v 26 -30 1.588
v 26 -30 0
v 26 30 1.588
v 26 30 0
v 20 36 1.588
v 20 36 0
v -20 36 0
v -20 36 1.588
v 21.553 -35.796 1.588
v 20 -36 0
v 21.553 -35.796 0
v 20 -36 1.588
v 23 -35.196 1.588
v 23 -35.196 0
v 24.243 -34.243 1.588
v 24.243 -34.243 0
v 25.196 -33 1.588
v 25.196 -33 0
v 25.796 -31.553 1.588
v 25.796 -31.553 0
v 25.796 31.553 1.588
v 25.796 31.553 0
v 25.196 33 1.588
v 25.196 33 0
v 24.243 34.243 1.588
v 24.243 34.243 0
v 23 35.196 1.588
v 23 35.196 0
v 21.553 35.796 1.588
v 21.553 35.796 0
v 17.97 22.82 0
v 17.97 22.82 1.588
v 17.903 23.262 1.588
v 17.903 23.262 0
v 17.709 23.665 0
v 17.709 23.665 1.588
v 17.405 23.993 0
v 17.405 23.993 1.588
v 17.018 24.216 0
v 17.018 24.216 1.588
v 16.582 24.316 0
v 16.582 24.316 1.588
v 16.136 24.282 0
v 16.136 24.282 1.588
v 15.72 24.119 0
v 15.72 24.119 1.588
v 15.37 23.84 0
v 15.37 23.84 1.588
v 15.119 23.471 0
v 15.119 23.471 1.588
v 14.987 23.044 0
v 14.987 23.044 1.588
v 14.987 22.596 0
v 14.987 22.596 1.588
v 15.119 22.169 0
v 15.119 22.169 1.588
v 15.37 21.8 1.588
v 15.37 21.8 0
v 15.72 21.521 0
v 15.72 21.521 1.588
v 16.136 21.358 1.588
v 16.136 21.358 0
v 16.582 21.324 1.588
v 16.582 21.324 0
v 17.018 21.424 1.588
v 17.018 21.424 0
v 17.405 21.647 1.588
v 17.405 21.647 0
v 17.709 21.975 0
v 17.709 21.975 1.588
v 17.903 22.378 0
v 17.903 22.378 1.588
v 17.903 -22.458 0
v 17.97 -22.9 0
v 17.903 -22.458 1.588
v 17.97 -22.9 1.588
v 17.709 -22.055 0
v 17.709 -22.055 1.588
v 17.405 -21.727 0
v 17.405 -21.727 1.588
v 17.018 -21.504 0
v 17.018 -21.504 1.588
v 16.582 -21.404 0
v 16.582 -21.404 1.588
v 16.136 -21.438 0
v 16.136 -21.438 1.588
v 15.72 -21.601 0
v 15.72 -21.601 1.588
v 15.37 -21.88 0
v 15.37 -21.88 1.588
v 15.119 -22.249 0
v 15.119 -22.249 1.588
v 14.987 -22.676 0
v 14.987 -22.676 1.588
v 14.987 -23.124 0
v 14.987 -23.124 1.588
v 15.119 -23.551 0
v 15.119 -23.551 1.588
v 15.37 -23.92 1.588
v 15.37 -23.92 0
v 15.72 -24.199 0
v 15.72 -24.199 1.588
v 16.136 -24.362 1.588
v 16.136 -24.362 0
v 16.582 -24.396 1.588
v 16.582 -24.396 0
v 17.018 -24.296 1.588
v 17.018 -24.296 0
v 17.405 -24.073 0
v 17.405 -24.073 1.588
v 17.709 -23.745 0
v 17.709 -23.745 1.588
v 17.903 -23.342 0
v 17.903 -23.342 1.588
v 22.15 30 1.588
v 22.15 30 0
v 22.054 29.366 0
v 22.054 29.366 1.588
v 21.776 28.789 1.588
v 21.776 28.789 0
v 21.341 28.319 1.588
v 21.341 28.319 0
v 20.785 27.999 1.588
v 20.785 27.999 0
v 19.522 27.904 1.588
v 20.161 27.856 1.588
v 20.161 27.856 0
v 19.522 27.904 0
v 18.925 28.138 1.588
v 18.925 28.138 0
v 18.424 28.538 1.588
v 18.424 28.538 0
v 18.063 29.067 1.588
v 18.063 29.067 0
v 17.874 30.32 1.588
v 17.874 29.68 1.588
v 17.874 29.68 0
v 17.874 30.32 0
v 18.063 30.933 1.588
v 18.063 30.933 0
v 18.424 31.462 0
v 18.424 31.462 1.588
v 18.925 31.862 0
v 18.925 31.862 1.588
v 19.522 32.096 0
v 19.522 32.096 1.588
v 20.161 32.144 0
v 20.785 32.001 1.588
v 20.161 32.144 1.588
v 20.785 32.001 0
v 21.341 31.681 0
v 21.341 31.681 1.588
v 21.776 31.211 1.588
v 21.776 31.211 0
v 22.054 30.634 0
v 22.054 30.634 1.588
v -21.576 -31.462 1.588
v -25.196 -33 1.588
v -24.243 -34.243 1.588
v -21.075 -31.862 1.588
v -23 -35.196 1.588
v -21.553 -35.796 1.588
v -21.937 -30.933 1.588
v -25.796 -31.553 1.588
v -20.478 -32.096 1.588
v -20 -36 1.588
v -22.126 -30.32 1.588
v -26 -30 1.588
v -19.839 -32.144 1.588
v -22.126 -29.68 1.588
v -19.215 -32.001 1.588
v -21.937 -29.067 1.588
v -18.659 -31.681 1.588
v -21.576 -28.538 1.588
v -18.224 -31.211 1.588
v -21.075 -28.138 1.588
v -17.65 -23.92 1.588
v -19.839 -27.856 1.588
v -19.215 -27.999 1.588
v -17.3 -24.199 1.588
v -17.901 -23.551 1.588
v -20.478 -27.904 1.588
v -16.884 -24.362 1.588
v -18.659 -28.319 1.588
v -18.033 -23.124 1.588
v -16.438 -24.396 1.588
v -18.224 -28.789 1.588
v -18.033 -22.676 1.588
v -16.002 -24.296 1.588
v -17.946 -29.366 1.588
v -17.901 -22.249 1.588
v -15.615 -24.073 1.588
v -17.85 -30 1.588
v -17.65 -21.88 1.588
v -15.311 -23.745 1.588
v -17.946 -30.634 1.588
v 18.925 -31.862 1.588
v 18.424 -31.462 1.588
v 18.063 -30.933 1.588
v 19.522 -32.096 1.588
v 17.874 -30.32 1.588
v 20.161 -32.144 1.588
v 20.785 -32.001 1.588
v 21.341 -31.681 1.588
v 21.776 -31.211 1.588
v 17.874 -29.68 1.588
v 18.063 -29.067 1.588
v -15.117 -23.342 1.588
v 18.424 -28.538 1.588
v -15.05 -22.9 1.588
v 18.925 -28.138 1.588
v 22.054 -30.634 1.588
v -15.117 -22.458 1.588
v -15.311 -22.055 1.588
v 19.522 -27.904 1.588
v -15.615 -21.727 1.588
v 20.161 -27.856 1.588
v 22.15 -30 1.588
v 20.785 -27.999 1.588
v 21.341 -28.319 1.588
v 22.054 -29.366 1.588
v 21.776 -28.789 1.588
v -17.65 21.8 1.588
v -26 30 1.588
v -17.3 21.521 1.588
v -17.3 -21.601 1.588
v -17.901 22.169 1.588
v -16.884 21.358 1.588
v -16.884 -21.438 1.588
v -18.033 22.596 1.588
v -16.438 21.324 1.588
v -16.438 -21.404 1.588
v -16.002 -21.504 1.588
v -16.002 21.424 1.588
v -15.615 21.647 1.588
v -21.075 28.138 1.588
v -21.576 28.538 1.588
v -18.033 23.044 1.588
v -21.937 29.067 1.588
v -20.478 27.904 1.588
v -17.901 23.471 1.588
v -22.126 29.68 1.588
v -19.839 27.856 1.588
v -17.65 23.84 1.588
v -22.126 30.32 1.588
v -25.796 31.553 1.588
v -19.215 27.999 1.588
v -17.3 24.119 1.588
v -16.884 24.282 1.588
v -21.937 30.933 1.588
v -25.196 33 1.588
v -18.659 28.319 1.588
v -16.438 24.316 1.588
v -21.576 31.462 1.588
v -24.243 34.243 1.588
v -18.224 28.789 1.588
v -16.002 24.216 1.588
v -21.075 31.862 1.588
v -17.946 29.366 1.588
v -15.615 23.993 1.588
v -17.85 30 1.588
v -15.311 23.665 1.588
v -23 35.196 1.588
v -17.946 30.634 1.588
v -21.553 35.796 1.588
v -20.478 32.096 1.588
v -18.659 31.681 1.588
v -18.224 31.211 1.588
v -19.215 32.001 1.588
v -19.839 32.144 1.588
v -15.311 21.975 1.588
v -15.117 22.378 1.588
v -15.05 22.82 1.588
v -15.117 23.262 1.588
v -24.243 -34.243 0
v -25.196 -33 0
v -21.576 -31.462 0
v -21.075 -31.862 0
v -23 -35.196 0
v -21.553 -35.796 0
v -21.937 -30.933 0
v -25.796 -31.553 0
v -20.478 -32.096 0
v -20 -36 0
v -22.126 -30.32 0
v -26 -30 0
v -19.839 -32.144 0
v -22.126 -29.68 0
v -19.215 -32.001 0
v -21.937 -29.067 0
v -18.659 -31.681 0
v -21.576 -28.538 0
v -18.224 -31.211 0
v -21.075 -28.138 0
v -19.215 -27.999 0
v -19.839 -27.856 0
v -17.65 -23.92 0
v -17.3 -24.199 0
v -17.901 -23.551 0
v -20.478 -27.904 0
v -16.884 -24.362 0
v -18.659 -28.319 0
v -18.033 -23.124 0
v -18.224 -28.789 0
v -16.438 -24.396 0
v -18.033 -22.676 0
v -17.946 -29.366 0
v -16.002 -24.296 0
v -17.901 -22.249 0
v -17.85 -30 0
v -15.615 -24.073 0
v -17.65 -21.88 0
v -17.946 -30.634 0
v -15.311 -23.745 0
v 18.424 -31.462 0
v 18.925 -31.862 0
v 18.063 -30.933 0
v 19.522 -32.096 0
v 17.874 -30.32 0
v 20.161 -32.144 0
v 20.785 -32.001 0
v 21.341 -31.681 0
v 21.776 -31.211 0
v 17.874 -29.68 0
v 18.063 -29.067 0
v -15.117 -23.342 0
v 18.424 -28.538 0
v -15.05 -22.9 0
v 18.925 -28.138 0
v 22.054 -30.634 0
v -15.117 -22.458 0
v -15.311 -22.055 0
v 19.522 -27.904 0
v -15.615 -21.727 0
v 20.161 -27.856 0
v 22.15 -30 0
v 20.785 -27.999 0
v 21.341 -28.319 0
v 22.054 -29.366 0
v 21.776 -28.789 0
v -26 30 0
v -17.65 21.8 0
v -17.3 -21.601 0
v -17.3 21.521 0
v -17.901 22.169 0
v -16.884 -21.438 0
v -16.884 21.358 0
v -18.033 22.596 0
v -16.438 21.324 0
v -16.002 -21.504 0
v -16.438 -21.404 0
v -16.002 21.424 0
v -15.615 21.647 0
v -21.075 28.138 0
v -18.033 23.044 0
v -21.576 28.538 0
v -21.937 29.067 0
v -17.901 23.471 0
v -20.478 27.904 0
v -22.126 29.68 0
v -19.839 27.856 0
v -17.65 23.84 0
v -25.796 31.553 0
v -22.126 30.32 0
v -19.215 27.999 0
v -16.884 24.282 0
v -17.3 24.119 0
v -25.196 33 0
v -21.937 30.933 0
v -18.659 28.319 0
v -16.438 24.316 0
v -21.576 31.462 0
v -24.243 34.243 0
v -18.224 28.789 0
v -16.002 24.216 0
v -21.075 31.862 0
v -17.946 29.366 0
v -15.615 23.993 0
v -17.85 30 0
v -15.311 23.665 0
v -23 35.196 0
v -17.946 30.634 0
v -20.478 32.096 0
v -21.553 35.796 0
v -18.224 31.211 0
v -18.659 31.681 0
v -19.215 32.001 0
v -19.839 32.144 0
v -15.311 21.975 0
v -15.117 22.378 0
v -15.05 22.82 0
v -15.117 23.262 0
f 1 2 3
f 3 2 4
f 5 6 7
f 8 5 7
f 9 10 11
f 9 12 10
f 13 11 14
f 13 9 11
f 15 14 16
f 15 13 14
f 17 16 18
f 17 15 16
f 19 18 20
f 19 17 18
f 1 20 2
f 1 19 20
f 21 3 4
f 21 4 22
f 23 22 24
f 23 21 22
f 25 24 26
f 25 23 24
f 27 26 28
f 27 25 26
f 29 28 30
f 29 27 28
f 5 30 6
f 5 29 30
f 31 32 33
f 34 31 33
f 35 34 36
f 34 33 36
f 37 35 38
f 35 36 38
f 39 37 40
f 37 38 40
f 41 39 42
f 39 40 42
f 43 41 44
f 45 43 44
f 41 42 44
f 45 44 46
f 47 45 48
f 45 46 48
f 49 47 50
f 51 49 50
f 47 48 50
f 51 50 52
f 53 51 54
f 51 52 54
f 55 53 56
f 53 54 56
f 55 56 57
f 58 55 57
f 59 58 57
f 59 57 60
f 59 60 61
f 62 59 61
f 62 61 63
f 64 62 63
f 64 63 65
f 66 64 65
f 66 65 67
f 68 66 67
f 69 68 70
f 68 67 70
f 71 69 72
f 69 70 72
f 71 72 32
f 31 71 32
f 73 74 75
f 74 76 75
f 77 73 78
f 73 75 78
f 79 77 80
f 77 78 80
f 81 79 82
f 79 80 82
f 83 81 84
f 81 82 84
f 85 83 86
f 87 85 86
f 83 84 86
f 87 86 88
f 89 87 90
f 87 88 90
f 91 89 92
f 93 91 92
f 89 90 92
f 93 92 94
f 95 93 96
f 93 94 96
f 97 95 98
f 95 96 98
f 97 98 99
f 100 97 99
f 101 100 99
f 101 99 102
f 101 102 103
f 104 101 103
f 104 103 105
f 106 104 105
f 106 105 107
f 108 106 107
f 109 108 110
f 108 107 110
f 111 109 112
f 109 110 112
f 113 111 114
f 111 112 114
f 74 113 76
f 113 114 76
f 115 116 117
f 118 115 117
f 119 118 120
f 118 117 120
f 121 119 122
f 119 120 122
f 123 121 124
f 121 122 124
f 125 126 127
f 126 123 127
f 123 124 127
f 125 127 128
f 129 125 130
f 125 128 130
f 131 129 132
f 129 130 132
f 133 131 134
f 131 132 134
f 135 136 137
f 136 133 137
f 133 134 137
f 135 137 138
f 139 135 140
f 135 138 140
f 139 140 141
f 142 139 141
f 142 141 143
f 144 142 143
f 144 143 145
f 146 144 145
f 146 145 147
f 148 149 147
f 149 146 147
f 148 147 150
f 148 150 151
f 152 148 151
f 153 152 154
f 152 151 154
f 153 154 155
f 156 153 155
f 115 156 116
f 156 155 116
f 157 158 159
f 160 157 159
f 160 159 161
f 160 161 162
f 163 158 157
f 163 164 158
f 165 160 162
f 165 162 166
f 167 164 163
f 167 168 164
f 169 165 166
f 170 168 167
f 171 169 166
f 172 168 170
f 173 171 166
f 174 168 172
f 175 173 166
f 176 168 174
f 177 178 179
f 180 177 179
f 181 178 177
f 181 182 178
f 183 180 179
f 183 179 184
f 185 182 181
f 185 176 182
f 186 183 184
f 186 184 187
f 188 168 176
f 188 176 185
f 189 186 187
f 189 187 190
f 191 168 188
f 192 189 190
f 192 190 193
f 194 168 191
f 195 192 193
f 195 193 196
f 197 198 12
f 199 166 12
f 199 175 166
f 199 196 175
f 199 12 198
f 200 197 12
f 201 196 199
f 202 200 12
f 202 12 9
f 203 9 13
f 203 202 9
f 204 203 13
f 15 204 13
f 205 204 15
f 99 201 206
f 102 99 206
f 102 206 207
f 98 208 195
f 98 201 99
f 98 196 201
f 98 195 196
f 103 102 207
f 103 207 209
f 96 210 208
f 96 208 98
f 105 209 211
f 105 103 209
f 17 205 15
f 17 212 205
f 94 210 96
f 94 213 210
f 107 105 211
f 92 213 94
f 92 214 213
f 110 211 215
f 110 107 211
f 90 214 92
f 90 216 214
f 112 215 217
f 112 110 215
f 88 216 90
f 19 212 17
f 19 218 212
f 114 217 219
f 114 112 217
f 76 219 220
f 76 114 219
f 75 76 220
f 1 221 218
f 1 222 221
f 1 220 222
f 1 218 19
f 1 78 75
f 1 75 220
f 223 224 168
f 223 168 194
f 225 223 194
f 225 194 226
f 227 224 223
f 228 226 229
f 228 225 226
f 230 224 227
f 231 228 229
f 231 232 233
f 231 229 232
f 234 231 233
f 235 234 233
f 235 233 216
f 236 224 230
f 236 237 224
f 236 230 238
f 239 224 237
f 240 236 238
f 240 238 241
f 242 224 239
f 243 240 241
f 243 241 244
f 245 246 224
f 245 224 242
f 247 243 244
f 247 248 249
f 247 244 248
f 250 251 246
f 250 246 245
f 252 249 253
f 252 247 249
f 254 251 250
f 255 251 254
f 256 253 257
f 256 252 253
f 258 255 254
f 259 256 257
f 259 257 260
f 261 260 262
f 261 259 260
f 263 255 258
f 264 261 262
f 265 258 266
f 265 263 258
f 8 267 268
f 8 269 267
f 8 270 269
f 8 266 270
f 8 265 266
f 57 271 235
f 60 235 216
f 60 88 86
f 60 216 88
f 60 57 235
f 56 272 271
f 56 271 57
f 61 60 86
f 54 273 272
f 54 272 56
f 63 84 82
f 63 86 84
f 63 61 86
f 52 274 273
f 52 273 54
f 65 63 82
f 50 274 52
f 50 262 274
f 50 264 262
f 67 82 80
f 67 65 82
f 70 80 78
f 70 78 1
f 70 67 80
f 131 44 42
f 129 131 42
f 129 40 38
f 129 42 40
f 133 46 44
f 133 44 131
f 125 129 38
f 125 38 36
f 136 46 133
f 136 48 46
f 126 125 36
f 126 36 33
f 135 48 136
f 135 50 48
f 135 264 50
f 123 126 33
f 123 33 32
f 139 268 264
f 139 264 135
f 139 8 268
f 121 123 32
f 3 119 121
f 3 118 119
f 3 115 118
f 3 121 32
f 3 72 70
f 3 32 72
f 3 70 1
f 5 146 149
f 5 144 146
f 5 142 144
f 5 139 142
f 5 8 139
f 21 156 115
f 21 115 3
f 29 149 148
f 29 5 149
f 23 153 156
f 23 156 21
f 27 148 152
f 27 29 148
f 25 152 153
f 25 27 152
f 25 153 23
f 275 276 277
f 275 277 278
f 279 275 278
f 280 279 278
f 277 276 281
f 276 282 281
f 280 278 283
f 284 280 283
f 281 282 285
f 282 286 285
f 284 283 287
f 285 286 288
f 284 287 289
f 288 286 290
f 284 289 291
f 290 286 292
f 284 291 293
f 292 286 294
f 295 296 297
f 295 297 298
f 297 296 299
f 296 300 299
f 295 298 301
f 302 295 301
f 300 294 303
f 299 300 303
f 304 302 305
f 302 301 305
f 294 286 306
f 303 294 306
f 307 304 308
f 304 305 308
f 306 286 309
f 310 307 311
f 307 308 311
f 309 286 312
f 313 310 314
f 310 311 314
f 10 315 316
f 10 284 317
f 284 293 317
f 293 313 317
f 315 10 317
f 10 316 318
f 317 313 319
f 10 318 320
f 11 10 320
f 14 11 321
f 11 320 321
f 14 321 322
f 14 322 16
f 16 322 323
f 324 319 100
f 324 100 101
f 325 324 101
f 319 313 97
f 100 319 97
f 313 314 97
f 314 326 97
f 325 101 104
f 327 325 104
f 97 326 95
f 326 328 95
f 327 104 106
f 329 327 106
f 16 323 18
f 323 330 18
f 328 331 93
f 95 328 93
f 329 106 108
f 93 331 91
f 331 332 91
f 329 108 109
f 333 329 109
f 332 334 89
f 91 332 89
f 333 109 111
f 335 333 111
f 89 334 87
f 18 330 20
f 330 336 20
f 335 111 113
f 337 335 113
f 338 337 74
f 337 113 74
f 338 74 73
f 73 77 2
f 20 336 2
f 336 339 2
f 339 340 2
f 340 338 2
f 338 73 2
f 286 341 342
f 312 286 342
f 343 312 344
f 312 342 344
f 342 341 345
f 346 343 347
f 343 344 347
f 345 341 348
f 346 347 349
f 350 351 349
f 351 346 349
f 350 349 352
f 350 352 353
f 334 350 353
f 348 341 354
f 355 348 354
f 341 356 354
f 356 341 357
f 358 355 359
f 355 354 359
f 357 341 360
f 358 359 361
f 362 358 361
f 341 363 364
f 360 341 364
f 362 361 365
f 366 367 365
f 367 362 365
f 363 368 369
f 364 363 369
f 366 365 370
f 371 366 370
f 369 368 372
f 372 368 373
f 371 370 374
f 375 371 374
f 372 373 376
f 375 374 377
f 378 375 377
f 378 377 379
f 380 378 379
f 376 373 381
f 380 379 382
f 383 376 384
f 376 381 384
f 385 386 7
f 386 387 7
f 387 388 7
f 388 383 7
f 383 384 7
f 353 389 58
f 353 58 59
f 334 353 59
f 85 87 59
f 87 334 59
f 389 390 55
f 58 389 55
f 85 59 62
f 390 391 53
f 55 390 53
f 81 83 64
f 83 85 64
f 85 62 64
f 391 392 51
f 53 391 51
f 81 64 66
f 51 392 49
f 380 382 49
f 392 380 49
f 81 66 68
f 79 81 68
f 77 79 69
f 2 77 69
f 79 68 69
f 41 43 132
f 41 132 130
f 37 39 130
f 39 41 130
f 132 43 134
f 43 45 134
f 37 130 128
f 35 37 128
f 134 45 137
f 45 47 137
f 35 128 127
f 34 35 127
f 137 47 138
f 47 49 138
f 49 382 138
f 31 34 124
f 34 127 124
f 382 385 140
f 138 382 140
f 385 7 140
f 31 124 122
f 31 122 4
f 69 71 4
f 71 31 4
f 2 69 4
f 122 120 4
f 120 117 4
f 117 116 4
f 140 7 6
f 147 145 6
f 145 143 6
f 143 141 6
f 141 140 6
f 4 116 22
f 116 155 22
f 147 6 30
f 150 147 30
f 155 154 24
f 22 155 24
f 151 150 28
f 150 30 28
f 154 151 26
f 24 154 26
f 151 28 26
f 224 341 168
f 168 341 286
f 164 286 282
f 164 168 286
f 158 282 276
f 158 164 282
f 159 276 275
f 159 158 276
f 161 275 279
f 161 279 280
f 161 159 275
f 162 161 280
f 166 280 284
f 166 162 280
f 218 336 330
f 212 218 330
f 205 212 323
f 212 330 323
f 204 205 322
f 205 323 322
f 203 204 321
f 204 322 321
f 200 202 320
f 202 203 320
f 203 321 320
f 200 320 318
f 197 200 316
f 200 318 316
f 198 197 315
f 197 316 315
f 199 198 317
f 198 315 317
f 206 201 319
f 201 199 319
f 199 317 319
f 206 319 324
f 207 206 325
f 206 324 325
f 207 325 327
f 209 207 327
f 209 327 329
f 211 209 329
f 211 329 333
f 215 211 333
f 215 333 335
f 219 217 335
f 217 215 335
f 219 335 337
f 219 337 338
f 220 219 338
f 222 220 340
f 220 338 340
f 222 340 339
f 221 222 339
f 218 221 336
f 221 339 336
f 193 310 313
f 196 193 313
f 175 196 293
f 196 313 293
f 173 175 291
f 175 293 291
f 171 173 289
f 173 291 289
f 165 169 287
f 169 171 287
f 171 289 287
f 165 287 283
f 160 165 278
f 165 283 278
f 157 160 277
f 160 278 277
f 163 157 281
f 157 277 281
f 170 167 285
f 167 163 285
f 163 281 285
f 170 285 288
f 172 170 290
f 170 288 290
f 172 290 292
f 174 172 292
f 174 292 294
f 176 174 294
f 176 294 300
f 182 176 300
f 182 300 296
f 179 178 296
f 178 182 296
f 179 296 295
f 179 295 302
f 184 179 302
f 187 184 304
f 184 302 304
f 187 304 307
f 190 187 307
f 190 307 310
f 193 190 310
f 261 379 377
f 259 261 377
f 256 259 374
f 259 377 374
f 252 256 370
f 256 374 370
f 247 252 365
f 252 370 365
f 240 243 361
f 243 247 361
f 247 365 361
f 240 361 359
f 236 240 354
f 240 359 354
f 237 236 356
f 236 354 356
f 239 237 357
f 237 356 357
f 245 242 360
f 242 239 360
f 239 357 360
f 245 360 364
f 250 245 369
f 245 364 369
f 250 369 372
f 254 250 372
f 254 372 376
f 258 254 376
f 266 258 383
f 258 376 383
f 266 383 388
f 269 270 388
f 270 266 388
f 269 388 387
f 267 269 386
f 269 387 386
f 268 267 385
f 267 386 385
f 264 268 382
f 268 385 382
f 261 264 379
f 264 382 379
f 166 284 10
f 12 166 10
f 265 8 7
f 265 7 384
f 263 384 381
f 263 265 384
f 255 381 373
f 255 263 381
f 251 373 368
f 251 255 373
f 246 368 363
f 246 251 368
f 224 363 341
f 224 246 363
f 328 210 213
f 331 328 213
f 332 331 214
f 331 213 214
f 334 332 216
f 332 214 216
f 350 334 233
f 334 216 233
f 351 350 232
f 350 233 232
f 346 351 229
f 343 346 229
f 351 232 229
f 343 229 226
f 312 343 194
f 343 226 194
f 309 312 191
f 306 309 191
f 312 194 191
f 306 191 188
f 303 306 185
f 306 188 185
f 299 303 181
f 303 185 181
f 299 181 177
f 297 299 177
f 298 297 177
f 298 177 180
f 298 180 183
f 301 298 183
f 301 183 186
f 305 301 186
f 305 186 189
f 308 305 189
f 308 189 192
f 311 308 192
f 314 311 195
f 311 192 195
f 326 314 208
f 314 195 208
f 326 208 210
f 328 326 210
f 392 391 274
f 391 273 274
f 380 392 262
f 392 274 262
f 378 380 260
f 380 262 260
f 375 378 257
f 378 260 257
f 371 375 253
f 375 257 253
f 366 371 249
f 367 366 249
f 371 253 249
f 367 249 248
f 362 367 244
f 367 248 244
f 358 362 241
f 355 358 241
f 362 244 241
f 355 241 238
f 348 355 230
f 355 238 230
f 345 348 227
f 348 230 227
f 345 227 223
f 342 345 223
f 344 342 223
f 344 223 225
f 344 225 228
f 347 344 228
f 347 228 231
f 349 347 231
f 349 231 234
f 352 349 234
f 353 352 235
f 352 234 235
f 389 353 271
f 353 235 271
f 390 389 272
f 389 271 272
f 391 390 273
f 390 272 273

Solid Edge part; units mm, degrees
sketch "Sketch1" plane through (0, 0, 0) normal (0, 0, 1) x (1, 0, 0)
  line L0 (26, -36) -> (26, 36)
  line L1 (26, 36) -> (-26, 36)
  line L2 (-26, 36) -> (-26, -36)
  line L3 (-26, -36) -> (26, -36)
  circle A0 centre (20, 30) radius 2.15
  circle A1 centre (-20, -30) radius 2.15
  circle A2 centre (-20, 30) radius 2.15
  circle A3 centre (20, -30) radius 2.15
extrude "Protrusion1" add sketch "Sketch1" along normal blind 1.5875
fillet "Round_1" radius 6 4 edges at (-26, -36, 0.7937) (26, -36, 0.7937) (26, 36, 0.7937) (-26, 36, 0.7937)
sketch "Sketch2" plane through (0, 0, 1.5875) normal (0, 0, 1) x (1, 0, 0)
  circle A0 centre (16.47, 22.82) radius 1.5
  circle A1 centre (16.47, -22.9) radius 1.5
  circle A2 centre (-16.55, -22.9) radius 1.5
  circle A3 centre (-16.55, 22.82) radius 1.5
extrude "Cutout1" cut sketch "Sketch2" against normal up to next
properties material "Acrylic, high impact grade"
